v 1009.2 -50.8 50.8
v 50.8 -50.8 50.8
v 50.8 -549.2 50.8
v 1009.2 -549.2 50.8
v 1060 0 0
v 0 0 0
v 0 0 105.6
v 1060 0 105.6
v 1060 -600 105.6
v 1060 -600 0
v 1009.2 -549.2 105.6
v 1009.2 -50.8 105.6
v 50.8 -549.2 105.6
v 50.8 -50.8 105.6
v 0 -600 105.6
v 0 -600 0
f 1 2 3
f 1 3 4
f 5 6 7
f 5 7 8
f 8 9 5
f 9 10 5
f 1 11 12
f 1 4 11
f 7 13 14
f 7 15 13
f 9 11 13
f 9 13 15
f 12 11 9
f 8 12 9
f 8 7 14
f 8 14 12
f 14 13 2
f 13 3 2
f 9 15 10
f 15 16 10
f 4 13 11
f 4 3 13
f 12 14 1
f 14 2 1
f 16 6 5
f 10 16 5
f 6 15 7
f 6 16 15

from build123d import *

# Parameters (mm, degrees)
F0_W     = 1060
F0_H     = 600
F1_DEPTH = 4
F2_W     = 1060
F2_H     = 600
F3_DEPTH = 101.6
F4_T     = -50.8


with BuildPart() as f1:
    # F0 (on Top) → F1 (new body)
    with BuildSketch(Plane.XY):
        with Locations((530, -300)):
            Rectangle(F0_W, F0_H)
    extrude(amount=F1_DEPTH)

    # F2 (on face) → F3 (join)
    with BuildSketch(Plane.XY.offset(4)):
        with Locations((530, -300)):
            Rectangle(F2_W, F2_H)
    extrude(amount=F3_DEPTH)

    # F4
    f4_openings = [f1.faces().sort_by_distance(p)[0] for p in [
        (530, -300, 105.6),
    ]]
    offset(amount=F4_T, openings=f4_openings)


solid = f1.part
